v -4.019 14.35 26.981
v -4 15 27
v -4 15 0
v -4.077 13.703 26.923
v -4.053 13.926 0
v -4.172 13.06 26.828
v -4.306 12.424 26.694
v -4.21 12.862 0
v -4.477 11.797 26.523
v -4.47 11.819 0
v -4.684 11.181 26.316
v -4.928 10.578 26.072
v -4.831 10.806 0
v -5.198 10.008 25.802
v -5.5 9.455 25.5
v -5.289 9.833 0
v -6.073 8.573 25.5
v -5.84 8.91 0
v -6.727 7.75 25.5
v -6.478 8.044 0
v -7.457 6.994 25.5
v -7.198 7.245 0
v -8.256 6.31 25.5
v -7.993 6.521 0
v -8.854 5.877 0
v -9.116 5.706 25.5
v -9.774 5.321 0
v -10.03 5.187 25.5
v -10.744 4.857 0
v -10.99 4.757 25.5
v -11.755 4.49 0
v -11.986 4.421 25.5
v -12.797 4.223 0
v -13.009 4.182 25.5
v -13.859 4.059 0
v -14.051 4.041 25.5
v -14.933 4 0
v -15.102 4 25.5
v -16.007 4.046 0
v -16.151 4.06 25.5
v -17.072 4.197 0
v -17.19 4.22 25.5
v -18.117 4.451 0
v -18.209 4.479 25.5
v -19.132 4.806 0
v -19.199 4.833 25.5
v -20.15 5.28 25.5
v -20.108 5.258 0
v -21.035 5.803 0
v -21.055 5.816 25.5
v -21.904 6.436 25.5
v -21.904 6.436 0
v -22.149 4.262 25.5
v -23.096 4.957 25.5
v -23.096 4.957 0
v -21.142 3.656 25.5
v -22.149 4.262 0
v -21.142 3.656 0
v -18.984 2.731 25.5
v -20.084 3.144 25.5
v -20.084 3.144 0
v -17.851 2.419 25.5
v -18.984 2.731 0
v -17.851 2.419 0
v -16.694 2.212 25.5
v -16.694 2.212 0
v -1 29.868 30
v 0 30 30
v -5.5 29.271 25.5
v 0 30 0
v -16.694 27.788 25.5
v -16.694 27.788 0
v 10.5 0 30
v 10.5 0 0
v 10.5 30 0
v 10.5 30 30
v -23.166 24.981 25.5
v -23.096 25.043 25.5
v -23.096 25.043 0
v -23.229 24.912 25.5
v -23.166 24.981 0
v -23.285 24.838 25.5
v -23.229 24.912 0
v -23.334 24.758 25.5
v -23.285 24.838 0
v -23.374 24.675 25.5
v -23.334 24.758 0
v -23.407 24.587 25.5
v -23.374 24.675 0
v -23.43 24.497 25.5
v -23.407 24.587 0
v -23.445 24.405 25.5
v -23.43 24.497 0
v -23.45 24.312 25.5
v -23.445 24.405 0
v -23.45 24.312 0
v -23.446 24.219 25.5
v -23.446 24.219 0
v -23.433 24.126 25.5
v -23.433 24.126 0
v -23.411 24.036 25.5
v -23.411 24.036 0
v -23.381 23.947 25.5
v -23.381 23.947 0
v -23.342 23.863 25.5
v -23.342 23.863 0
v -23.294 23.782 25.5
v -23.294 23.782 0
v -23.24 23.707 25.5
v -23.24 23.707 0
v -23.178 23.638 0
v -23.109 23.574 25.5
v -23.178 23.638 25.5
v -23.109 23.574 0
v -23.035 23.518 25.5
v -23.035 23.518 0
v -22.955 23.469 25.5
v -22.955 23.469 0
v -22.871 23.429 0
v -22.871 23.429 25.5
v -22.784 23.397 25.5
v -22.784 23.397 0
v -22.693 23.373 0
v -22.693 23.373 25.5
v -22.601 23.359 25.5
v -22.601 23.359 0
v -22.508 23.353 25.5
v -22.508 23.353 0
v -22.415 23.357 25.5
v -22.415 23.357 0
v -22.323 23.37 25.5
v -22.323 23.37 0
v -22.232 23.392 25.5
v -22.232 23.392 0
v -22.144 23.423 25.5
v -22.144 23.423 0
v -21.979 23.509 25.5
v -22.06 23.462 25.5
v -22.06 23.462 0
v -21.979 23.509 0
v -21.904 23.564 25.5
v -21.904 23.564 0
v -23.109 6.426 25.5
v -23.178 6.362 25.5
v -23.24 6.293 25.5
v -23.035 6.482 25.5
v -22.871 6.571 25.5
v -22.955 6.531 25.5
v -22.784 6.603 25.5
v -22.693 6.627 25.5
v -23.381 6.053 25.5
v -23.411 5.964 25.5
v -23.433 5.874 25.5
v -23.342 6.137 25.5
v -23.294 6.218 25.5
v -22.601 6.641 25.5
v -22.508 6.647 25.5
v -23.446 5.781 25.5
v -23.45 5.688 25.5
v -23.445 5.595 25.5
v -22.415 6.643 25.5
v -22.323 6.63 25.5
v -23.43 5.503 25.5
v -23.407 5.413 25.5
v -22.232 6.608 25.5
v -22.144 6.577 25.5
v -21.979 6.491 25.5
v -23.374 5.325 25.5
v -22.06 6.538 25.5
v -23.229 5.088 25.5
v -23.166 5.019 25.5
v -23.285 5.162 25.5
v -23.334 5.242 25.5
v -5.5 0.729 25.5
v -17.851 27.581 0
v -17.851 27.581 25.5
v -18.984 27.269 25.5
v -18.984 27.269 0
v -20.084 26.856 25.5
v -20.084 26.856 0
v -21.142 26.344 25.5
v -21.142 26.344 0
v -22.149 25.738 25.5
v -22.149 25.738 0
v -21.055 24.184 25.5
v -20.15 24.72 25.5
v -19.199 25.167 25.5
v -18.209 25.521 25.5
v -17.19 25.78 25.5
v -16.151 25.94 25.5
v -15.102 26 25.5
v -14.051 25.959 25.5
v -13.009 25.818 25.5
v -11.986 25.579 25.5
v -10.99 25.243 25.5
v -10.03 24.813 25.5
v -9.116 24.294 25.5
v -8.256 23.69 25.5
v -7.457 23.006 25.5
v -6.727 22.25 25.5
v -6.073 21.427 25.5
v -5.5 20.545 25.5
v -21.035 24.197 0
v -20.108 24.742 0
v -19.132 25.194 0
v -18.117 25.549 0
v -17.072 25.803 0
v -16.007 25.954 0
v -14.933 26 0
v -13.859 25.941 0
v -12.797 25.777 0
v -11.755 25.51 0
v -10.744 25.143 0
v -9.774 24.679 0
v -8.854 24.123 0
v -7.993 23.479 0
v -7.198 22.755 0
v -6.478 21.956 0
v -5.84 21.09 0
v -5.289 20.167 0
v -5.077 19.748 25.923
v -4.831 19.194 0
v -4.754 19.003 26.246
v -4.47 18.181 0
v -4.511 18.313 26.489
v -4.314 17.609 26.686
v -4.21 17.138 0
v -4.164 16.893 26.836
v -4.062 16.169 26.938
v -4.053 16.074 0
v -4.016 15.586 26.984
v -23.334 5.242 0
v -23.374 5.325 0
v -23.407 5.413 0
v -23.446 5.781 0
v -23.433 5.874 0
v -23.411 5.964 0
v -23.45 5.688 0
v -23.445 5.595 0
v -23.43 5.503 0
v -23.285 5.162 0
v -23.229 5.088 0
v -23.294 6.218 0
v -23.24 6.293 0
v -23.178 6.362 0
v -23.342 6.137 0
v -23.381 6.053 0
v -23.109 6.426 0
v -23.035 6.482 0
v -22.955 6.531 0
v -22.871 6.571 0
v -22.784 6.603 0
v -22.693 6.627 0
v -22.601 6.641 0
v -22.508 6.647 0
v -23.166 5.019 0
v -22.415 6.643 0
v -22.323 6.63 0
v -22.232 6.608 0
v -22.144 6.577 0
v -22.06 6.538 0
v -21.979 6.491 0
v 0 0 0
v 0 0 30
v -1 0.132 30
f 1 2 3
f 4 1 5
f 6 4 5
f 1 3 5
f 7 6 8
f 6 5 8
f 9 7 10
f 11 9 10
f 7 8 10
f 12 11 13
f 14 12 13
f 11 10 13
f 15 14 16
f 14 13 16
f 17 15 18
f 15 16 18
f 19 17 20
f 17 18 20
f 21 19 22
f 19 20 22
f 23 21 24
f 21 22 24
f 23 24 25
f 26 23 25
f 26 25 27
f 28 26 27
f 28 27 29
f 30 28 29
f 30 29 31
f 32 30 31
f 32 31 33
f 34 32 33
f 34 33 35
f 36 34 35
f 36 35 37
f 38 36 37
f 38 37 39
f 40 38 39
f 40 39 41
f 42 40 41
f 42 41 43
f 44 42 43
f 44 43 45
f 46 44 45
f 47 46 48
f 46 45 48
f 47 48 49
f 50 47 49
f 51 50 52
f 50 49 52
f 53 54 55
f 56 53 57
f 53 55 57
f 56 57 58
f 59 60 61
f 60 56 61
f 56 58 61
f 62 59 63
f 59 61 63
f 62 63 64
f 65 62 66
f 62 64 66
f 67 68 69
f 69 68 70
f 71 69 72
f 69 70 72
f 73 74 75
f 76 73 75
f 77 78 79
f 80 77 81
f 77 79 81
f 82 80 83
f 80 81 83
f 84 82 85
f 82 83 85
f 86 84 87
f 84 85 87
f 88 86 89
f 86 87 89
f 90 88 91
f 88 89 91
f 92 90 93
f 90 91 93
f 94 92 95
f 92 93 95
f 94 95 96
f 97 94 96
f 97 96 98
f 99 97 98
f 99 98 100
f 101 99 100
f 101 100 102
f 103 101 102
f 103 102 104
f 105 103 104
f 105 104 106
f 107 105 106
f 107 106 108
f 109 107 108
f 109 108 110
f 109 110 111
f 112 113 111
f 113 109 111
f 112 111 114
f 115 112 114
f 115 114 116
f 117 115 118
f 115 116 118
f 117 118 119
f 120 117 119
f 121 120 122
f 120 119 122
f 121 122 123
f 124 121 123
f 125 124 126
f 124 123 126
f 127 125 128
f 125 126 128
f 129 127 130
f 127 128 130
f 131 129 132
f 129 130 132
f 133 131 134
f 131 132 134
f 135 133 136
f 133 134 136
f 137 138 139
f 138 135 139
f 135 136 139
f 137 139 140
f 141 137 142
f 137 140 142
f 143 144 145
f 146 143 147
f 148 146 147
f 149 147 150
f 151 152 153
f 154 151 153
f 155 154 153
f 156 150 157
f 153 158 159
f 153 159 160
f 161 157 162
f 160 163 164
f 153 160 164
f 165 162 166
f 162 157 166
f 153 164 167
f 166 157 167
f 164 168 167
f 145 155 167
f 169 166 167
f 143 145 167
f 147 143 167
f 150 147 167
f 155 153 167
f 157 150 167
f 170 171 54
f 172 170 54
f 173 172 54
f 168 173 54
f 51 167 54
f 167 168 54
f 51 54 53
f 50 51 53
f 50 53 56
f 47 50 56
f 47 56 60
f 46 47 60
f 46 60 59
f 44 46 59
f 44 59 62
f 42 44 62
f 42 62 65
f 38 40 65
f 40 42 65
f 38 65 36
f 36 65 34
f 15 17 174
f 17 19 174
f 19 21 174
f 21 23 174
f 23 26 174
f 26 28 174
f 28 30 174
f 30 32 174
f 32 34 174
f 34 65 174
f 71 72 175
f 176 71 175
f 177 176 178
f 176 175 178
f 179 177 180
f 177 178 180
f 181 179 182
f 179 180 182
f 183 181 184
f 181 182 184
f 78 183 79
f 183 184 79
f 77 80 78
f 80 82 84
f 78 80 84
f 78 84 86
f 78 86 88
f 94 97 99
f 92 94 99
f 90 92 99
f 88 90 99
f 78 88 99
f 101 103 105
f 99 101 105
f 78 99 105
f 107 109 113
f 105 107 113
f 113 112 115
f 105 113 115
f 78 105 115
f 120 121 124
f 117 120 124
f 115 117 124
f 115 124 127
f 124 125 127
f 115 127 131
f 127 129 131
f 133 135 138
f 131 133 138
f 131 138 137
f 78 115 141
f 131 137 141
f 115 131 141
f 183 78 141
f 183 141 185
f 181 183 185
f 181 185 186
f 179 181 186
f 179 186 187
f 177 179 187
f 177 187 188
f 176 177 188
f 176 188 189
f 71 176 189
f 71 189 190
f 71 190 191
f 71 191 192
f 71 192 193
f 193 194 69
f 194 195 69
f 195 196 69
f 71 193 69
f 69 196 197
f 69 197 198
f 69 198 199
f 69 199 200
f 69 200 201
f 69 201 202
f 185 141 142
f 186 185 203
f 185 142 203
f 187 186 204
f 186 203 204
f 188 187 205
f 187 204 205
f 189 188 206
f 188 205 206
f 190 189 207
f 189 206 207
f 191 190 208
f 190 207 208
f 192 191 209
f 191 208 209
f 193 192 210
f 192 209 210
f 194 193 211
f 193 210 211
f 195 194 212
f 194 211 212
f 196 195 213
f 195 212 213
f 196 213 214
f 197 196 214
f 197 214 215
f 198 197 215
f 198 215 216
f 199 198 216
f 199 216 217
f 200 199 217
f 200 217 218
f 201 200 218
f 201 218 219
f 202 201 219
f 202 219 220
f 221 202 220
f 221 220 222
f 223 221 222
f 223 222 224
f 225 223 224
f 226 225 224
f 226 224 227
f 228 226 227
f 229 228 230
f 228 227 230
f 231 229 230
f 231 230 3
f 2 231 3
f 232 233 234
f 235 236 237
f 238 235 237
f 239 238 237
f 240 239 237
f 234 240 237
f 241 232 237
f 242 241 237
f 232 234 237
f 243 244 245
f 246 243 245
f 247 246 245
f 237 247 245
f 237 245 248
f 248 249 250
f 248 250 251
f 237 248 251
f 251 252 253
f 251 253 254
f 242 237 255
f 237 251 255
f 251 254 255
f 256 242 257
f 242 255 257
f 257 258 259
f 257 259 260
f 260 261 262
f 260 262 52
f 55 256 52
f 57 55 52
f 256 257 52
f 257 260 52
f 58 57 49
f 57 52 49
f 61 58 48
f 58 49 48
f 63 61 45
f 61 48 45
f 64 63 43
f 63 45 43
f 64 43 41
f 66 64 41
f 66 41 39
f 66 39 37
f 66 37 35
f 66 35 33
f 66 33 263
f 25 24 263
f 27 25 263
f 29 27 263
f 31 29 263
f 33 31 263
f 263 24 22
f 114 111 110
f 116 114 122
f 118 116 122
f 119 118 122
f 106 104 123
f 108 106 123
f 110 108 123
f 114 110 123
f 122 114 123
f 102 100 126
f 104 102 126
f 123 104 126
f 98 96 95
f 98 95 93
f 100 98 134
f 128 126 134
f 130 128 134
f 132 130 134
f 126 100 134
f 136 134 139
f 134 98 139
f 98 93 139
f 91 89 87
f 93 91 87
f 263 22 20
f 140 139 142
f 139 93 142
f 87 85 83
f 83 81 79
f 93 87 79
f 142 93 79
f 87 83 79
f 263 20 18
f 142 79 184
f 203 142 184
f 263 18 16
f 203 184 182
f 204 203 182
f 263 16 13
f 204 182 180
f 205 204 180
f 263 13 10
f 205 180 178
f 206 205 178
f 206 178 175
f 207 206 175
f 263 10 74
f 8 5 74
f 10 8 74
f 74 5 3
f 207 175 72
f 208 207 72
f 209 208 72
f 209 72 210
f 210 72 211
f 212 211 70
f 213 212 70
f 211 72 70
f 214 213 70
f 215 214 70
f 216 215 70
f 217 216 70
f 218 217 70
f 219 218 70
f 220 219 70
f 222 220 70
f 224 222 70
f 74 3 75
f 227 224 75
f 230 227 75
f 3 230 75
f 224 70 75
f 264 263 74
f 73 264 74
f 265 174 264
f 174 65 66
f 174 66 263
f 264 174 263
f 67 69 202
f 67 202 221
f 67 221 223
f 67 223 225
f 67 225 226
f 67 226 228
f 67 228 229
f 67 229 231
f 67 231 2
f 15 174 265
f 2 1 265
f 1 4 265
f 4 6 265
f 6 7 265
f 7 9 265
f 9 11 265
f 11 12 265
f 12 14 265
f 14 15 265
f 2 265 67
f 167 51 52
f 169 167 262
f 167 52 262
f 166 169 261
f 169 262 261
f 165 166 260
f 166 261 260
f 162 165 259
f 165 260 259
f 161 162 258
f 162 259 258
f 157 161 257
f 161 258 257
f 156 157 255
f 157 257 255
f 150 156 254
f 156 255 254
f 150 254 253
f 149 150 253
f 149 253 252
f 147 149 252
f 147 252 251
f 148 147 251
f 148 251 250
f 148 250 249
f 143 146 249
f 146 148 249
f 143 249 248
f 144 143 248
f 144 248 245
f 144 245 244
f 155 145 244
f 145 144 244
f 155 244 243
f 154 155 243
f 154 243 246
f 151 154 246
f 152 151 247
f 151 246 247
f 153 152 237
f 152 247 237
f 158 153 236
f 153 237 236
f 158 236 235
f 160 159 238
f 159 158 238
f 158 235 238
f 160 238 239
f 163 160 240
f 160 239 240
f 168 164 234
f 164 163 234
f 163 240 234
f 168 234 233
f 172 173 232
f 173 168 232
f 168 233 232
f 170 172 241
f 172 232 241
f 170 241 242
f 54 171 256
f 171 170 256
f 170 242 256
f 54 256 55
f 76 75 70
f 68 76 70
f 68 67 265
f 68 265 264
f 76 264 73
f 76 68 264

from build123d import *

# Parameters (mm, degrees)
F1_DEPTH = 30
F3_DEPTH = 40


with BuildPart() as f1:
    # F0 (on Top) → F1 (new body)
    with BuildSketch(Plane.XY):
        with BuildLine():
            Line((-16.694256, 2.211744), (0, 0))
            Line((0, 0), (10.5, 0))
            Line((10.5, 0), (10.5, 30))
            Line((10.5, 30), (0, 30))
            Line((0, 30), (-16.694256, 27.788256))
            ThreePointArc((-16.694256, 27.788256), (-20.084053, 26.855902), (-23.096234, 25.042957))
            ThreePointArc((-23.096234, 25.042957), (-23.239598, 23.707125), (-21.903766, 23.563762))
            ThreePointArc((-21.903766, 23.563762), (-10.253497, 24.923241), (-4, 15))
            ThreePointArc((-4, 15), (-10.253497, 5.076759), (-21.903766, 6.436238))
            ThreePointArc((-21.903766, 6.436238), (-23.239598, 6.292875), (-23.096234, 4.957043))
            ThreePointArc((-23.096234, 4.957043), (-20.084053, 3.144098), (-16.694256, 2.211744))
        make_face()
    extrude(amount=F1_DEPTH)

    # F2 (on face) → F3 (cut)
    with BuildSketch(Plane.XZ):
        Polygon((0, 35.99402), (-26.560755, 35.99402), (-26.560755, 25.5), (-5.5, 25.5), (-1, 30), (0, 30), align=None)
    extrude(amount=-F3_DEPTH, mode=Mode.SUBTRACT)


solid = f1.part
